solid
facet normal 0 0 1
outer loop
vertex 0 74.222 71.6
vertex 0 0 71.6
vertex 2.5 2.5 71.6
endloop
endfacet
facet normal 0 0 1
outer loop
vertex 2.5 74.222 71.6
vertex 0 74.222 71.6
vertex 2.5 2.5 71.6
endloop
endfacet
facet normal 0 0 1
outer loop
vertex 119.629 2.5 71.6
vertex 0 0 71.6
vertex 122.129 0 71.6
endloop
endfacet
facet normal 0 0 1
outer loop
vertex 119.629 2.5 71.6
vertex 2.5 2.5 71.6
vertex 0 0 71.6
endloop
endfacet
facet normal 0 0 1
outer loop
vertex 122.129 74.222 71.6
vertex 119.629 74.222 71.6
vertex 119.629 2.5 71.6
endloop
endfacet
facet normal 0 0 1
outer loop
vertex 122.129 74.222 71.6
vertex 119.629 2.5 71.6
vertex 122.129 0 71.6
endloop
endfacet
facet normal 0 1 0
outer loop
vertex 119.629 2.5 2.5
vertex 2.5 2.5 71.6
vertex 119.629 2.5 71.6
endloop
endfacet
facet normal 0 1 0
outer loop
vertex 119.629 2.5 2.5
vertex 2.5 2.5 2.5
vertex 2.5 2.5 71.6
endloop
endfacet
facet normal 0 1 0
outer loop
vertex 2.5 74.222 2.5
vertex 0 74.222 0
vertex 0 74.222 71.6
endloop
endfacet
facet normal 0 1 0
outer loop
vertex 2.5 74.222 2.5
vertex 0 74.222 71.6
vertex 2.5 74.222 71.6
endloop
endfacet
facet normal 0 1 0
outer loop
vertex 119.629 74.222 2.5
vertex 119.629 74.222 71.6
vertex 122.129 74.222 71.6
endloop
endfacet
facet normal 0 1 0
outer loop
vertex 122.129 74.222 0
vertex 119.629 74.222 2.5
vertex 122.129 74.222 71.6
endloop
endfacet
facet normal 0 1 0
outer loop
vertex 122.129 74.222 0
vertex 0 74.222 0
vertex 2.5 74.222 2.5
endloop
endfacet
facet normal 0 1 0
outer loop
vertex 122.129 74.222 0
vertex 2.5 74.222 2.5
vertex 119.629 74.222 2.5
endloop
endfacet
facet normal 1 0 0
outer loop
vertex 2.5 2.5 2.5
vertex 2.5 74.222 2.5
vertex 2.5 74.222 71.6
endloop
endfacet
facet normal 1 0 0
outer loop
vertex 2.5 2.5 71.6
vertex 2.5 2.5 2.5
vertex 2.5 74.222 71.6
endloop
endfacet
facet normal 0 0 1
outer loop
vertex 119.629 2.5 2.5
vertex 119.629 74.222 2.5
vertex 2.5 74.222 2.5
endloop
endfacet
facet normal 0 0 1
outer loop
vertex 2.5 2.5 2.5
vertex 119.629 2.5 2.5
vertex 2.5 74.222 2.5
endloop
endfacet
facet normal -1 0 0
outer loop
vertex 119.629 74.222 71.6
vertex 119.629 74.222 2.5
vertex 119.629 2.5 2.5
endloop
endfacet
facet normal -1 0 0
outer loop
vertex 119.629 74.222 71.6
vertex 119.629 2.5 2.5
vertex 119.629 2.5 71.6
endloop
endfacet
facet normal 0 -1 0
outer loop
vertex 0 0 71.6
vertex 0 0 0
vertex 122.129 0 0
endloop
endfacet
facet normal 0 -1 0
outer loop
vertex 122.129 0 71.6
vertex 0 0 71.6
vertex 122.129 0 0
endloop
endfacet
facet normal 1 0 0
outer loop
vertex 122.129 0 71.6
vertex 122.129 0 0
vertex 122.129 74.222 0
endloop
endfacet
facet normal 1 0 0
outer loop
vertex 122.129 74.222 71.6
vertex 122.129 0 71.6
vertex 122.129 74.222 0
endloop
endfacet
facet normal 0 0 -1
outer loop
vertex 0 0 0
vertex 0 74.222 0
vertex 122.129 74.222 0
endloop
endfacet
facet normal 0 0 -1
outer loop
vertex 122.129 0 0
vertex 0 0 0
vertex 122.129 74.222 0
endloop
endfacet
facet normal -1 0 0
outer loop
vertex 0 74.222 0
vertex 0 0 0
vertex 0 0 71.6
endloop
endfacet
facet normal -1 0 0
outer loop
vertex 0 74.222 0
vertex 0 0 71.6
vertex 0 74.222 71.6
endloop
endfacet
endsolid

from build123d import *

# Parameters (mm, degrees)
F0_W     = 122.128874
F0_H     = 74.222378
F1_DEPTH = 71.6
F2_T     = -2.5
F3_W     = 117.128874
F3_H     = 69.1
F4_DEPTH = 25


with BuildPart() as f1:
    # F0 (on Top) → F1 (new body)
    with BuildSketch(Plane.XY):
        with Locations((61.064437, 37.111189)):
            Rectangle(F0_W, F0_H)
    extrude(amount=F1_DEPTH)

    # F2
    f2_openings = [f1.faces().sort_by_distance(p)[0] for p in [
        (61.064437, 37.111189, 71.6),
    ]]
    offset(amount=F2_T, openings=f2_openings)

    # F3 (on face) → F4 (cut)
    with BuildSketch(Plane(origin=(0, 74.222378, 0), x_dir=(-1, 0, 0), z_dir=(0, 1, 0))):
        with Locations((-61.064437, 37.05)):
            Rectangle(F3_W, F3_H)
    extrude(amount=-F4_DEPTH, mode=Mode.SUBTRACT)


solid = f1.part
